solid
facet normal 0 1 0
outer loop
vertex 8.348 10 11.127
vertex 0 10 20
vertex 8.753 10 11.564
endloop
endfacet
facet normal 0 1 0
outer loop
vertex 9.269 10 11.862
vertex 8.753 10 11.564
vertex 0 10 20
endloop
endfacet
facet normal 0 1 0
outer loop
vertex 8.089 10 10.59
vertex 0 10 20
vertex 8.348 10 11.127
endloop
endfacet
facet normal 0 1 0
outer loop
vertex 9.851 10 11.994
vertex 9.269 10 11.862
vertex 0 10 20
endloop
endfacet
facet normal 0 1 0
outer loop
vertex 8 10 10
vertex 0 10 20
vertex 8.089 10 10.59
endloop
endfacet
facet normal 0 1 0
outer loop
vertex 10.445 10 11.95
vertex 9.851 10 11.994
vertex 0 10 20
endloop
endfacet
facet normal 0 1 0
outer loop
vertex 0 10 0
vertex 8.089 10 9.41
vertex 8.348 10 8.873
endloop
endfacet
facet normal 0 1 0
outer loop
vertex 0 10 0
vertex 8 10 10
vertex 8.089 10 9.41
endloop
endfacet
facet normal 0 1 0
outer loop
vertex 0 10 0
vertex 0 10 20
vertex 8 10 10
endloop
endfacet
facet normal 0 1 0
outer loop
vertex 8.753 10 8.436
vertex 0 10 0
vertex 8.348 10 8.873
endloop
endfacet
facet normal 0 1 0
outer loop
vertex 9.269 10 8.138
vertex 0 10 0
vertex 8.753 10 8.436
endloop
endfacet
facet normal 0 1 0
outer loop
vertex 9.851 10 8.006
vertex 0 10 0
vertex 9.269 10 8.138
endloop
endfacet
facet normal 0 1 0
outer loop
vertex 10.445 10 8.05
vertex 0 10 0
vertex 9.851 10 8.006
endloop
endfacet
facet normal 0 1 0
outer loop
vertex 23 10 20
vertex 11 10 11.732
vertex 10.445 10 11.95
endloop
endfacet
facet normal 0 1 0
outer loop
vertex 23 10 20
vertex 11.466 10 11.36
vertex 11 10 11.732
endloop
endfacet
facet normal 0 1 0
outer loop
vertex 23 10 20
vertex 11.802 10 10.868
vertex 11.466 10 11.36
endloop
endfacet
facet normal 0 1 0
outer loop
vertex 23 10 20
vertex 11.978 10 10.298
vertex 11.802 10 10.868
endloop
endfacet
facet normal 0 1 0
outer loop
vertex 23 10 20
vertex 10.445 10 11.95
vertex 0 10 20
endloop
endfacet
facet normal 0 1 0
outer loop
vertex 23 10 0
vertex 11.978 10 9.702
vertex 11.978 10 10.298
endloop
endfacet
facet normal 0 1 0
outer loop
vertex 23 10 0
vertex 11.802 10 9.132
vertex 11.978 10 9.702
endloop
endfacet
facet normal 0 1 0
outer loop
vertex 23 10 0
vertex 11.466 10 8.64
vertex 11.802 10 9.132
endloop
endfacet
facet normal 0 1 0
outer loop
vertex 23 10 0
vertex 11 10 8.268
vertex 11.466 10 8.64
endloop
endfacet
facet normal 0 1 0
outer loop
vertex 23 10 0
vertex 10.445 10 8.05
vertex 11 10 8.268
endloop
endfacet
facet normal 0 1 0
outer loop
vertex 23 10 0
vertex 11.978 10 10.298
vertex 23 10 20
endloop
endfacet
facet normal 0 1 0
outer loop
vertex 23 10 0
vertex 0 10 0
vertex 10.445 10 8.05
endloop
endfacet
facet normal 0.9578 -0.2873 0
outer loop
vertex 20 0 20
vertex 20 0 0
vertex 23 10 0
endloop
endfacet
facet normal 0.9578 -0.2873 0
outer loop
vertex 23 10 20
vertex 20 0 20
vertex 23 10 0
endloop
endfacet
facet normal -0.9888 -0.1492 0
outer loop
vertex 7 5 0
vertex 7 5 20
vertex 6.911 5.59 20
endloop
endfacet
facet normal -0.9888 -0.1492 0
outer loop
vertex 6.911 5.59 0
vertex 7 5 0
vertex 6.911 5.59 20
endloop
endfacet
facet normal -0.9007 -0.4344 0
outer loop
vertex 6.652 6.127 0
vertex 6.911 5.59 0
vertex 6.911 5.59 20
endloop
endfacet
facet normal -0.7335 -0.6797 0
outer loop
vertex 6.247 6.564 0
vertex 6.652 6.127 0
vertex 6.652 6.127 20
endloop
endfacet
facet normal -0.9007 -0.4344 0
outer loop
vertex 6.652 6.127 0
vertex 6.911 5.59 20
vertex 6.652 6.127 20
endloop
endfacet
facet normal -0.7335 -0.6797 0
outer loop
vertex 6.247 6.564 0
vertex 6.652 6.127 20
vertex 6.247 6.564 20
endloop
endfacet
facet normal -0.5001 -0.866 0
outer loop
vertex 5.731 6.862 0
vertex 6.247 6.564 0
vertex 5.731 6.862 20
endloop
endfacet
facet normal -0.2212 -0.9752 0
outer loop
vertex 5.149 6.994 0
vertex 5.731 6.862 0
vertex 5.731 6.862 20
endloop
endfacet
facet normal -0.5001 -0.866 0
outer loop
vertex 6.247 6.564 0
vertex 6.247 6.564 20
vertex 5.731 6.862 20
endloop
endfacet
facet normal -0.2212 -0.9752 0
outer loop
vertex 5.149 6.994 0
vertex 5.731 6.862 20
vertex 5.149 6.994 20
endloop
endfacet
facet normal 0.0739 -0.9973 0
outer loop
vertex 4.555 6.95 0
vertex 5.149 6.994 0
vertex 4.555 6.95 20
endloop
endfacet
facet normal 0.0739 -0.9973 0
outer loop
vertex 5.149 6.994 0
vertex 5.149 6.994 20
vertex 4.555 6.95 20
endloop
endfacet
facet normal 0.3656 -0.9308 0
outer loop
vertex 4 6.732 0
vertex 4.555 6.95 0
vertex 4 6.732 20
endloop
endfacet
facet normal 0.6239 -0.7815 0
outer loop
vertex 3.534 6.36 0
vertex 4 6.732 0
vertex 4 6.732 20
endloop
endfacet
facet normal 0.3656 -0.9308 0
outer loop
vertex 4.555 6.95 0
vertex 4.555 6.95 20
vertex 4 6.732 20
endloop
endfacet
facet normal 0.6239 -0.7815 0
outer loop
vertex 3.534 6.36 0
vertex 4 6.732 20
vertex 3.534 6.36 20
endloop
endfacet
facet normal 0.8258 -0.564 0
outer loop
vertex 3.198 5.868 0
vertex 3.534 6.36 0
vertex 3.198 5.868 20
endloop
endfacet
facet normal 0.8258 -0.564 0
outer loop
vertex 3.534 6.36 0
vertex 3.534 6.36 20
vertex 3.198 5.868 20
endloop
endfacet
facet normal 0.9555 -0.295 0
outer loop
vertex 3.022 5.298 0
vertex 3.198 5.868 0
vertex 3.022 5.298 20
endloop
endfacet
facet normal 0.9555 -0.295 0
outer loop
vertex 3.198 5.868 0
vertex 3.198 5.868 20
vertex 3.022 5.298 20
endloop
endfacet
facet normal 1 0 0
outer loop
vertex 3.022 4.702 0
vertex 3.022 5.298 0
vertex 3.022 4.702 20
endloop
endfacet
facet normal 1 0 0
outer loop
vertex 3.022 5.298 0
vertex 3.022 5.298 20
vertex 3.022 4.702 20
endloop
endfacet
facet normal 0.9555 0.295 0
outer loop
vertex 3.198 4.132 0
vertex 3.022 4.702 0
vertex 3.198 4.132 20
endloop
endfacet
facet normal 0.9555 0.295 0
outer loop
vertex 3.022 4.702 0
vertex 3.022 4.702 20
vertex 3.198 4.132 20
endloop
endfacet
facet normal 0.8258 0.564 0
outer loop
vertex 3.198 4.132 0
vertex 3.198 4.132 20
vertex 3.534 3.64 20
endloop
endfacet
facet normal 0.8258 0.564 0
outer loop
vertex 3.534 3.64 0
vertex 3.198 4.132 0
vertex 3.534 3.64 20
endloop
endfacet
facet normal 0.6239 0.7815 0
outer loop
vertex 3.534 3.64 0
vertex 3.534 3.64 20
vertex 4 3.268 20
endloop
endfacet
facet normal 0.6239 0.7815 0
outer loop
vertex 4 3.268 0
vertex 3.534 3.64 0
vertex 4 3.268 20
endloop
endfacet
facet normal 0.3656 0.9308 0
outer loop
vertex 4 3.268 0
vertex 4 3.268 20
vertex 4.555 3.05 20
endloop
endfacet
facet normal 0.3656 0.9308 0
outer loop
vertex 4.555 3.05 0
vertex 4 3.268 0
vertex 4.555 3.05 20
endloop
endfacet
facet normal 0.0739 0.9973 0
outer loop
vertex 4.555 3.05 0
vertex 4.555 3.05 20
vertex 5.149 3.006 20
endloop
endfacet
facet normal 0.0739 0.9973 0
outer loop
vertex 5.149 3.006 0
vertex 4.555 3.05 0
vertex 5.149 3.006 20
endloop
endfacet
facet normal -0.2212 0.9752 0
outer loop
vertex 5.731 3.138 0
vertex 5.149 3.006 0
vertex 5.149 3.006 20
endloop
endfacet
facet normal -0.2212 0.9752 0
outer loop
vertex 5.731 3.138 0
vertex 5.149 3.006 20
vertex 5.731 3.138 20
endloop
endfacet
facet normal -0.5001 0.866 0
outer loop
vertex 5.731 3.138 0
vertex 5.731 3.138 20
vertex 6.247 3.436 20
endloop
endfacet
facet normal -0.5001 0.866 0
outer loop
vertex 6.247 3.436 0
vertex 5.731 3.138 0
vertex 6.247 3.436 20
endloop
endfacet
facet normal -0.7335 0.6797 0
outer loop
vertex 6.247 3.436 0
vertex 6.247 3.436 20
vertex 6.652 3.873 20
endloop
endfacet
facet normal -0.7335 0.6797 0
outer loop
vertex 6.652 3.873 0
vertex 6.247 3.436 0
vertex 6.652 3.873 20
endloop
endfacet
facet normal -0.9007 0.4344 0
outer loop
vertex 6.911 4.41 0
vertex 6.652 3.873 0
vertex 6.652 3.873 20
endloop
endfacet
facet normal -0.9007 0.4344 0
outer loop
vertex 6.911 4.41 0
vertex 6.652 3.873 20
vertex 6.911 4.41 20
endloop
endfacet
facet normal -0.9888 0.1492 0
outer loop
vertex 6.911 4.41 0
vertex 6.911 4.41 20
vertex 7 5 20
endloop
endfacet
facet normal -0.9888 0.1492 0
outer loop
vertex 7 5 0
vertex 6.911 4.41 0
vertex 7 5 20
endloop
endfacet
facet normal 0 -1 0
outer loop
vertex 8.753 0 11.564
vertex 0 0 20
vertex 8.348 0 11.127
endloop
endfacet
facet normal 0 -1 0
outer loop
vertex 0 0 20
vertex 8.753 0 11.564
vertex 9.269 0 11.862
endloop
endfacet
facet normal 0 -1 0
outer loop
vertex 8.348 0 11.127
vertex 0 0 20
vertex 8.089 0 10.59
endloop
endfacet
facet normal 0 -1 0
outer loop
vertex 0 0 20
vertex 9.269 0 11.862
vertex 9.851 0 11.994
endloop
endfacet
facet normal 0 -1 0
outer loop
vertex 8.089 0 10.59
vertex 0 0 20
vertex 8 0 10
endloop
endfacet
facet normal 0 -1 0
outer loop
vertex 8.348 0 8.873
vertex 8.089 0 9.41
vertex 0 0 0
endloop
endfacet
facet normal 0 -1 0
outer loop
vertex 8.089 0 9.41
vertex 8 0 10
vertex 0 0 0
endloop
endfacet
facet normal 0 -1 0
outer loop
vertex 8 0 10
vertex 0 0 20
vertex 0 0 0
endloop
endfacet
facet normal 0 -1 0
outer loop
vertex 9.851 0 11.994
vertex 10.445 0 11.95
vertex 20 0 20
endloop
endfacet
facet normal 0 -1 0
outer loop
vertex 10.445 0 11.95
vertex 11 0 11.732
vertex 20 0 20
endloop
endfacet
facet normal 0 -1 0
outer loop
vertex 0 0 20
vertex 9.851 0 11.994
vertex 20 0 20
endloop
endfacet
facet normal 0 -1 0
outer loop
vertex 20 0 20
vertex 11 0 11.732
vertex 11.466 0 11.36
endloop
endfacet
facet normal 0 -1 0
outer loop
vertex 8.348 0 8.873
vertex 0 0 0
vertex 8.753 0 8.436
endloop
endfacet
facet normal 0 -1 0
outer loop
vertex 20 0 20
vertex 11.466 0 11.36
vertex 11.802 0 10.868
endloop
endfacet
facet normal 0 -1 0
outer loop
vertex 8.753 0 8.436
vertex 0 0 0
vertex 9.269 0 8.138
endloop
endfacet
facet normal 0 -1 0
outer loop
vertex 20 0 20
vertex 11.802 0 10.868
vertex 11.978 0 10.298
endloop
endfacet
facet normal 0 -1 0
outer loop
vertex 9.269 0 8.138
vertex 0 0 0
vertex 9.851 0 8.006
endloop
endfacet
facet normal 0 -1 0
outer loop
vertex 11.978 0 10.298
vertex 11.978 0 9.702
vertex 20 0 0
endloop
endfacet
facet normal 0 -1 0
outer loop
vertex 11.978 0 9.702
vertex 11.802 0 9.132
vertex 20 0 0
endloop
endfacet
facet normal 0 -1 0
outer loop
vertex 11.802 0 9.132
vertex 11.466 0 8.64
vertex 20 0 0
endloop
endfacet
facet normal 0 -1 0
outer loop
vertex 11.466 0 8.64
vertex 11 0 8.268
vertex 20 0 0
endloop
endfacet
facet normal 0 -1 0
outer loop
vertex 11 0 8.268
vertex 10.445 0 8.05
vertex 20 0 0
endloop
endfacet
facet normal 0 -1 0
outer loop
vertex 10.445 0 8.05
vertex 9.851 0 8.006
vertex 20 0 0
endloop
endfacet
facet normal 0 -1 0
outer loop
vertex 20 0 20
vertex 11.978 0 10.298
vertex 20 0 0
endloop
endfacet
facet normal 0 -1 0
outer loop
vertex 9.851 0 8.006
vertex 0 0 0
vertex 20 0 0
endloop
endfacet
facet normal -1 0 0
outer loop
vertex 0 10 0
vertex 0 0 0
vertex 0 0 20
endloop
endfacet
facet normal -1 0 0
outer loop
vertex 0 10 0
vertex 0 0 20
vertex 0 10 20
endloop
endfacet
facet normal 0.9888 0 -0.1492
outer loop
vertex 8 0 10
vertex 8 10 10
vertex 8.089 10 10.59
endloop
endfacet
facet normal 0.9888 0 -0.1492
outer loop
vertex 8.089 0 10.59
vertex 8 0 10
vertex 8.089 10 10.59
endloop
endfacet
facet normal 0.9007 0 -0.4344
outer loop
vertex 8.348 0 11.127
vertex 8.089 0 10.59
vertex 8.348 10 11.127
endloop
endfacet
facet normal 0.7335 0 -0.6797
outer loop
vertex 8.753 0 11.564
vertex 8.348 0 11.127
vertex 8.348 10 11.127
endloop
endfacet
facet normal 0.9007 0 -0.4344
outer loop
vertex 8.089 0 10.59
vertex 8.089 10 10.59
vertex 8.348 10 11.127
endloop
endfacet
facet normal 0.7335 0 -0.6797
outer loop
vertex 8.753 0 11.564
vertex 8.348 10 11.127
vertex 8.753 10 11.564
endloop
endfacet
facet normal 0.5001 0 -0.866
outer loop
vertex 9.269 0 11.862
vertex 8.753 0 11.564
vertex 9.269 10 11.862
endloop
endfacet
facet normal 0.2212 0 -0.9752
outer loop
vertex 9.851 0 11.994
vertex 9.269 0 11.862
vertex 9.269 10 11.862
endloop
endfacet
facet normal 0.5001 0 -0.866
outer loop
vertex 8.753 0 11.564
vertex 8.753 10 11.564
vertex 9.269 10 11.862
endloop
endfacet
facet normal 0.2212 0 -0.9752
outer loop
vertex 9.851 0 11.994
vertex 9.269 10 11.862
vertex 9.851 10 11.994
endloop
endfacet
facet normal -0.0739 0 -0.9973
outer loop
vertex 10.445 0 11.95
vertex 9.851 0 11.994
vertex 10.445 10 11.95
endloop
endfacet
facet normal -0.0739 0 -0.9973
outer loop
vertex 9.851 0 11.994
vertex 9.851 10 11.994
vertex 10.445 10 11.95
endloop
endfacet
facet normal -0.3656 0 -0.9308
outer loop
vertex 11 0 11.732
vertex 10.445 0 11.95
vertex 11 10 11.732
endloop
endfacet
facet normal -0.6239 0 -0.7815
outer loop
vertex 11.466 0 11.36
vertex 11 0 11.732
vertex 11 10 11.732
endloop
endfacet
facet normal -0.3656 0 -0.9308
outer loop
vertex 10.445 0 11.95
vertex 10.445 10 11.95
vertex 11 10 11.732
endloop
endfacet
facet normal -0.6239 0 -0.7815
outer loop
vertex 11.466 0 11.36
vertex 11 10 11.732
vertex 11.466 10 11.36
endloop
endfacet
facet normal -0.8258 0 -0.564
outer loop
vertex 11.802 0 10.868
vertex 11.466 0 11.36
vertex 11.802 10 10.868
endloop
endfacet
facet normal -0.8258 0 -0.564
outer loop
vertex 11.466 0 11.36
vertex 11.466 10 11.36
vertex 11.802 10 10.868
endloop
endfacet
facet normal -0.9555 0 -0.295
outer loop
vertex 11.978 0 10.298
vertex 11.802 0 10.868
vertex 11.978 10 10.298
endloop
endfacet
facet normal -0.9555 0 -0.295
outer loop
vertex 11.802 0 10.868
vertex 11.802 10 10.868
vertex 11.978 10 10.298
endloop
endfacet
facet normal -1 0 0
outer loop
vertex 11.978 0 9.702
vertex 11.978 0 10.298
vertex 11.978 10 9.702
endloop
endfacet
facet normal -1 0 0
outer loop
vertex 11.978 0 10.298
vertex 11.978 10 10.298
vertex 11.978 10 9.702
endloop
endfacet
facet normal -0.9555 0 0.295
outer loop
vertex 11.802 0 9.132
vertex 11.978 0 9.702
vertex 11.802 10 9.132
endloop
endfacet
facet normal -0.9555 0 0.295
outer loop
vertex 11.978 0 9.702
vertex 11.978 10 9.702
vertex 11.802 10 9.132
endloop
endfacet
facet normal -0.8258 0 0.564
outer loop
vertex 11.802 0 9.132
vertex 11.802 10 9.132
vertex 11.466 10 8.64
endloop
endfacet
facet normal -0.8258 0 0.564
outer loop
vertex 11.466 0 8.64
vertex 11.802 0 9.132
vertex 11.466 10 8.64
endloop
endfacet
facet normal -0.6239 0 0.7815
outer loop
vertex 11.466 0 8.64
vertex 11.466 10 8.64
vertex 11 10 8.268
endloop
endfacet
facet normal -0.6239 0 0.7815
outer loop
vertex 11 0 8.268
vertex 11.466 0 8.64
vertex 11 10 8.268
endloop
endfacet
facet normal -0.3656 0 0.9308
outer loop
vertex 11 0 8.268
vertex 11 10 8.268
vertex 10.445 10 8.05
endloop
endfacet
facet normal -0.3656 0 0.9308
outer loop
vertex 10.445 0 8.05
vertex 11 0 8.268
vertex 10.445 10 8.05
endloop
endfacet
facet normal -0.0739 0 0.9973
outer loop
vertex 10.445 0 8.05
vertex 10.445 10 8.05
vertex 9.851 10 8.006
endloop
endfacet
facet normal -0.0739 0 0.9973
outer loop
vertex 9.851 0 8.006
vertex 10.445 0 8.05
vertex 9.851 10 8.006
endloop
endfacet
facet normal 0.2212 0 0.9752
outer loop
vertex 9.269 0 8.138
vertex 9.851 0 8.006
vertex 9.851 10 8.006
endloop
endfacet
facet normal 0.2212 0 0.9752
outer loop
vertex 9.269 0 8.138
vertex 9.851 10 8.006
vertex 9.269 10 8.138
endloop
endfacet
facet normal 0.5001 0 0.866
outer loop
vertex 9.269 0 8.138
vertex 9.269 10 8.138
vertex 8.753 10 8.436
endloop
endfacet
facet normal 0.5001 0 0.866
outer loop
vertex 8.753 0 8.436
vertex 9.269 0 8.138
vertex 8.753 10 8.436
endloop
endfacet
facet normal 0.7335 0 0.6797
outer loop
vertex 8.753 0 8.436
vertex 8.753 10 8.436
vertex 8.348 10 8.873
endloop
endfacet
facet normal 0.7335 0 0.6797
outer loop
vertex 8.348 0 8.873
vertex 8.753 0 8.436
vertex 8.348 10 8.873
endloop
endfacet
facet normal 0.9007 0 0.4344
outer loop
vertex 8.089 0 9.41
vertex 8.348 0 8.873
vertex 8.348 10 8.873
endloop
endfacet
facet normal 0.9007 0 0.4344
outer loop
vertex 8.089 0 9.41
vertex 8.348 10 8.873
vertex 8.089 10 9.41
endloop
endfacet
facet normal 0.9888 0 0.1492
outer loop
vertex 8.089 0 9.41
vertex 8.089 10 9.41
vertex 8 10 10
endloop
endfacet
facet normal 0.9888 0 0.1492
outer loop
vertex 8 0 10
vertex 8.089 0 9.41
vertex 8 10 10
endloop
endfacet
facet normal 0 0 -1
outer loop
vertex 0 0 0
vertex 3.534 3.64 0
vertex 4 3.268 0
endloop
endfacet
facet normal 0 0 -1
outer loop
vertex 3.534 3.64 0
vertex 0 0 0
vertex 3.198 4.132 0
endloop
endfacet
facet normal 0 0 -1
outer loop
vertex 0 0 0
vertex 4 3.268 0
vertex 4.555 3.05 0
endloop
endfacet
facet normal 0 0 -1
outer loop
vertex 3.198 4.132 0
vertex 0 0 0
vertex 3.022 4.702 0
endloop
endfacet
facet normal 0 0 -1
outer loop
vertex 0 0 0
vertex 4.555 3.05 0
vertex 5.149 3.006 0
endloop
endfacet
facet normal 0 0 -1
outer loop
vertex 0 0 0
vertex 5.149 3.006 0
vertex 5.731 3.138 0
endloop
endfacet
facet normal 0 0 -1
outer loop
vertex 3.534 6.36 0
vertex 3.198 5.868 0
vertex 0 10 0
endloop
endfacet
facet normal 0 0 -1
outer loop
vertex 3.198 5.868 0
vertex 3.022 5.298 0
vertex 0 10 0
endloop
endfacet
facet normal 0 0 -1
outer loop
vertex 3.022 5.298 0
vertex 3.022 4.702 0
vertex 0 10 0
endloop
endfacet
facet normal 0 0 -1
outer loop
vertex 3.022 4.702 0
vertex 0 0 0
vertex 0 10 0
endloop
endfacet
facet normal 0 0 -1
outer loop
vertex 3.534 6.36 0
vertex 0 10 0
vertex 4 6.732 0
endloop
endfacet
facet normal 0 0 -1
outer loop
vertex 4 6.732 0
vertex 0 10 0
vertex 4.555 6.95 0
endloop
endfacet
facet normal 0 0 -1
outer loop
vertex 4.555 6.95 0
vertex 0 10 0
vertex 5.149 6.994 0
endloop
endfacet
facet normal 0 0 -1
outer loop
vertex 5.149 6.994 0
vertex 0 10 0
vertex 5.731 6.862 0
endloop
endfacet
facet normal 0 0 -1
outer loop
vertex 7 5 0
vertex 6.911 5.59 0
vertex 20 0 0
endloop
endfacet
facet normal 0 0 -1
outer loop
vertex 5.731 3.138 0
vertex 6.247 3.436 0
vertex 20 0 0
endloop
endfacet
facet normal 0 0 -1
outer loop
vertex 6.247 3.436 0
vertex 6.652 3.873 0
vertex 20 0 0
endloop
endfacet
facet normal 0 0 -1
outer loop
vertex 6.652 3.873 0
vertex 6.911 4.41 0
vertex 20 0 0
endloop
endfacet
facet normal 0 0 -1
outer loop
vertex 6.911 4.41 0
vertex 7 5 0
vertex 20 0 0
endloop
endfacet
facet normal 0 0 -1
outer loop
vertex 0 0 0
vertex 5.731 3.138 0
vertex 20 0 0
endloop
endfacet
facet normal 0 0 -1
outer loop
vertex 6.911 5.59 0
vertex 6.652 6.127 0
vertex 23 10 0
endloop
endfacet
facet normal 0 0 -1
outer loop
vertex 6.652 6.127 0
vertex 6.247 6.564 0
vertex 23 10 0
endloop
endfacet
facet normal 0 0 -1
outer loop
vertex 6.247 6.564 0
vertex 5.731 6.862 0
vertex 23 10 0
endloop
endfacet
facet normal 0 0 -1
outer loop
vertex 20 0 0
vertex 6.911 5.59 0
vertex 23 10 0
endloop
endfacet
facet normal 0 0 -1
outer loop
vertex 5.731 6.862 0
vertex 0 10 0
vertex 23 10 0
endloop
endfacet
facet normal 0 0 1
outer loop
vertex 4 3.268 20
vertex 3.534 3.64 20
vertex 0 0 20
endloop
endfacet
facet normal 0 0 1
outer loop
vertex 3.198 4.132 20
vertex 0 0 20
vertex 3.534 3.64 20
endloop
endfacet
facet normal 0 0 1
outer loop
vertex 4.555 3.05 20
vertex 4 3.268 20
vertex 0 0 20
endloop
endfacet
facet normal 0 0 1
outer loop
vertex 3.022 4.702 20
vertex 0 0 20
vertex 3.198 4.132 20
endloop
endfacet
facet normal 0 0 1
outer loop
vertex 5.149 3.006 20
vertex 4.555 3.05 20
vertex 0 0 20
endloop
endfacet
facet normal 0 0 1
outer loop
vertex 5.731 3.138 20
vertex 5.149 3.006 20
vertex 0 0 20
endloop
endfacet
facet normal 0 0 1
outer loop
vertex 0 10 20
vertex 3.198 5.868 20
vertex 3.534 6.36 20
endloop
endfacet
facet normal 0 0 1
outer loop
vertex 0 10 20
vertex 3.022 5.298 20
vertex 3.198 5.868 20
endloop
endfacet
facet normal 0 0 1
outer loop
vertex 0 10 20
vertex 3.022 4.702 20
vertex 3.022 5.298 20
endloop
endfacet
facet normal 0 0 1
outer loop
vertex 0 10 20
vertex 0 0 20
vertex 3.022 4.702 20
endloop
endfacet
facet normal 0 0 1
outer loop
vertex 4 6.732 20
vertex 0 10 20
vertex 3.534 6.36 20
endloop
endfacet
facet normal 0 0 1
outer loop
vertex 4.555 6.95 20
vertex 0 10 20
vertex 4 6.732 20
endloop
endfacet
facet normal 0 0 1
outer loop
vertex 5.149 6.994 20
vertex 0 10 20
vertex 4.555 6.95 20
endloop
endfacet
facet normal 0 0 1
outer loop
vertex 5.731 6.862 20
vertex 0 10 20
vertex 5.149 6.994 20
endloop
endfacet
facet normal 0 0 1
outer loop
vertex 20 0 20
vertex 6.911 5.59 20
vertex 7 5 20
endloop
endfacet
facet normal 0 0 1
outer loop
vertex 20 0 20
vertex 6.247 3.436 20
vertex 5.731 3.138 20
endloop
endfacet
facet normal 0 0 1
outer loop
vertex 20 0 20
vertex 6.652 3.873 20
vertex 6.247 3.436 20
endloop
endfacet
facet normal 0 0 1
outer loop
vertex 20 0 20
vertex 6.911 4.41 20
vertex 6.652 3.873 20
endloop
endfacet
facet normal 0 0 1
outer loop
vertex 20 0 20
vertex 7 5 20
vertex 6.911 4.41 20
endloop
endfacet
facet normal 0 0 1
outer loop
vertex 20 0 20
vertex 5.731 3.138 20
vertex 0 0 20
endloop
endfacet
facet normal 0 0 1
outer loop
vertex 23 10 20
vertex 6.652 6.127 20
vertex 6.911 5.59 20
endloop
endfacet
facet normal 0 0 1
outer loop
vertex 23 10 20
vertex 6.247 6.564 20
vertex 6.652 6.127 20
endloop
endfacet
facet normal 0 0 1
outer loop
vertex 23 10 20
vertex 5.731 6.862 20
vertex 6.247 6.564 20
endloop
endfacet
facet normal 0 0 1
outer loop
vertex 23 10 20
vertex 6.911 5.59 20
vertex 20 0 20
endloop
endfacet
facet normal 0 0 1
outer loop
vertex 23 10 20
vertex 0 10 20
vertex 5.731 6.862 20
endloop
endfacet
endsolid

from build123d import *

# Parameters (mm, degrees)
F0_W     = 20
F0_H     = 10
F1_DEPTH = 10
F2_DEPTH = 10
F3_DEPTH = 20
F4_R     = 2
F5_DEPTH = 25
F6_R     = 2
F7_DEPTH = 25


with BuildPart() as f1:
    # F0 (on Top) → F1 (new body)
    with BuildSketch(Plane.XY):
        with Locations((10, 5)):
            Rectangle(F0_W, F0_H)
    extrude(amount=F1_DEPTH)

    # F0 (on Top) → F2 (join)
    with BuildSketch(Plane.XY):
        with Locations((10, 5)):
            Rectangle(F0_W, F0_H)
        Polygon((20, 10), (20, 0), (23, 10), align=None)
    extrude(amount=F2_DEPTH)

    # F0 (on Top) → F3 (join)
    with BuildSketch(Plane.XY):
        with Locations((10, 5)):
            Rectangle(F0_W, F0_H)
        Polygon((20, 10), (20, 0), (23, 10), align=None)
    extrude(amount=F3_DEPTH)

    # F4 (on face) → F5 (cut)
    with BuildSketch(Plane(origin=(0, 10, 0), x_dir=(-1, 0, 0), z_dir=(0, 1, 0))):
        with Locations((-10, 10)):
            Circle(F4_R)
    extrude(amount=-F5_DEPTH, mode=Mode.SUBTRACT)

    # F6 (on face) → F7 (cut)
    with BuildSketch(Plane.XY.offset(20)):
        with Locations((5, 5)):
            Circle(F6_R)
    extrude(amount=-F7_DEPTH, mode=Mode.SUBTRACT)


solid = f1.part
